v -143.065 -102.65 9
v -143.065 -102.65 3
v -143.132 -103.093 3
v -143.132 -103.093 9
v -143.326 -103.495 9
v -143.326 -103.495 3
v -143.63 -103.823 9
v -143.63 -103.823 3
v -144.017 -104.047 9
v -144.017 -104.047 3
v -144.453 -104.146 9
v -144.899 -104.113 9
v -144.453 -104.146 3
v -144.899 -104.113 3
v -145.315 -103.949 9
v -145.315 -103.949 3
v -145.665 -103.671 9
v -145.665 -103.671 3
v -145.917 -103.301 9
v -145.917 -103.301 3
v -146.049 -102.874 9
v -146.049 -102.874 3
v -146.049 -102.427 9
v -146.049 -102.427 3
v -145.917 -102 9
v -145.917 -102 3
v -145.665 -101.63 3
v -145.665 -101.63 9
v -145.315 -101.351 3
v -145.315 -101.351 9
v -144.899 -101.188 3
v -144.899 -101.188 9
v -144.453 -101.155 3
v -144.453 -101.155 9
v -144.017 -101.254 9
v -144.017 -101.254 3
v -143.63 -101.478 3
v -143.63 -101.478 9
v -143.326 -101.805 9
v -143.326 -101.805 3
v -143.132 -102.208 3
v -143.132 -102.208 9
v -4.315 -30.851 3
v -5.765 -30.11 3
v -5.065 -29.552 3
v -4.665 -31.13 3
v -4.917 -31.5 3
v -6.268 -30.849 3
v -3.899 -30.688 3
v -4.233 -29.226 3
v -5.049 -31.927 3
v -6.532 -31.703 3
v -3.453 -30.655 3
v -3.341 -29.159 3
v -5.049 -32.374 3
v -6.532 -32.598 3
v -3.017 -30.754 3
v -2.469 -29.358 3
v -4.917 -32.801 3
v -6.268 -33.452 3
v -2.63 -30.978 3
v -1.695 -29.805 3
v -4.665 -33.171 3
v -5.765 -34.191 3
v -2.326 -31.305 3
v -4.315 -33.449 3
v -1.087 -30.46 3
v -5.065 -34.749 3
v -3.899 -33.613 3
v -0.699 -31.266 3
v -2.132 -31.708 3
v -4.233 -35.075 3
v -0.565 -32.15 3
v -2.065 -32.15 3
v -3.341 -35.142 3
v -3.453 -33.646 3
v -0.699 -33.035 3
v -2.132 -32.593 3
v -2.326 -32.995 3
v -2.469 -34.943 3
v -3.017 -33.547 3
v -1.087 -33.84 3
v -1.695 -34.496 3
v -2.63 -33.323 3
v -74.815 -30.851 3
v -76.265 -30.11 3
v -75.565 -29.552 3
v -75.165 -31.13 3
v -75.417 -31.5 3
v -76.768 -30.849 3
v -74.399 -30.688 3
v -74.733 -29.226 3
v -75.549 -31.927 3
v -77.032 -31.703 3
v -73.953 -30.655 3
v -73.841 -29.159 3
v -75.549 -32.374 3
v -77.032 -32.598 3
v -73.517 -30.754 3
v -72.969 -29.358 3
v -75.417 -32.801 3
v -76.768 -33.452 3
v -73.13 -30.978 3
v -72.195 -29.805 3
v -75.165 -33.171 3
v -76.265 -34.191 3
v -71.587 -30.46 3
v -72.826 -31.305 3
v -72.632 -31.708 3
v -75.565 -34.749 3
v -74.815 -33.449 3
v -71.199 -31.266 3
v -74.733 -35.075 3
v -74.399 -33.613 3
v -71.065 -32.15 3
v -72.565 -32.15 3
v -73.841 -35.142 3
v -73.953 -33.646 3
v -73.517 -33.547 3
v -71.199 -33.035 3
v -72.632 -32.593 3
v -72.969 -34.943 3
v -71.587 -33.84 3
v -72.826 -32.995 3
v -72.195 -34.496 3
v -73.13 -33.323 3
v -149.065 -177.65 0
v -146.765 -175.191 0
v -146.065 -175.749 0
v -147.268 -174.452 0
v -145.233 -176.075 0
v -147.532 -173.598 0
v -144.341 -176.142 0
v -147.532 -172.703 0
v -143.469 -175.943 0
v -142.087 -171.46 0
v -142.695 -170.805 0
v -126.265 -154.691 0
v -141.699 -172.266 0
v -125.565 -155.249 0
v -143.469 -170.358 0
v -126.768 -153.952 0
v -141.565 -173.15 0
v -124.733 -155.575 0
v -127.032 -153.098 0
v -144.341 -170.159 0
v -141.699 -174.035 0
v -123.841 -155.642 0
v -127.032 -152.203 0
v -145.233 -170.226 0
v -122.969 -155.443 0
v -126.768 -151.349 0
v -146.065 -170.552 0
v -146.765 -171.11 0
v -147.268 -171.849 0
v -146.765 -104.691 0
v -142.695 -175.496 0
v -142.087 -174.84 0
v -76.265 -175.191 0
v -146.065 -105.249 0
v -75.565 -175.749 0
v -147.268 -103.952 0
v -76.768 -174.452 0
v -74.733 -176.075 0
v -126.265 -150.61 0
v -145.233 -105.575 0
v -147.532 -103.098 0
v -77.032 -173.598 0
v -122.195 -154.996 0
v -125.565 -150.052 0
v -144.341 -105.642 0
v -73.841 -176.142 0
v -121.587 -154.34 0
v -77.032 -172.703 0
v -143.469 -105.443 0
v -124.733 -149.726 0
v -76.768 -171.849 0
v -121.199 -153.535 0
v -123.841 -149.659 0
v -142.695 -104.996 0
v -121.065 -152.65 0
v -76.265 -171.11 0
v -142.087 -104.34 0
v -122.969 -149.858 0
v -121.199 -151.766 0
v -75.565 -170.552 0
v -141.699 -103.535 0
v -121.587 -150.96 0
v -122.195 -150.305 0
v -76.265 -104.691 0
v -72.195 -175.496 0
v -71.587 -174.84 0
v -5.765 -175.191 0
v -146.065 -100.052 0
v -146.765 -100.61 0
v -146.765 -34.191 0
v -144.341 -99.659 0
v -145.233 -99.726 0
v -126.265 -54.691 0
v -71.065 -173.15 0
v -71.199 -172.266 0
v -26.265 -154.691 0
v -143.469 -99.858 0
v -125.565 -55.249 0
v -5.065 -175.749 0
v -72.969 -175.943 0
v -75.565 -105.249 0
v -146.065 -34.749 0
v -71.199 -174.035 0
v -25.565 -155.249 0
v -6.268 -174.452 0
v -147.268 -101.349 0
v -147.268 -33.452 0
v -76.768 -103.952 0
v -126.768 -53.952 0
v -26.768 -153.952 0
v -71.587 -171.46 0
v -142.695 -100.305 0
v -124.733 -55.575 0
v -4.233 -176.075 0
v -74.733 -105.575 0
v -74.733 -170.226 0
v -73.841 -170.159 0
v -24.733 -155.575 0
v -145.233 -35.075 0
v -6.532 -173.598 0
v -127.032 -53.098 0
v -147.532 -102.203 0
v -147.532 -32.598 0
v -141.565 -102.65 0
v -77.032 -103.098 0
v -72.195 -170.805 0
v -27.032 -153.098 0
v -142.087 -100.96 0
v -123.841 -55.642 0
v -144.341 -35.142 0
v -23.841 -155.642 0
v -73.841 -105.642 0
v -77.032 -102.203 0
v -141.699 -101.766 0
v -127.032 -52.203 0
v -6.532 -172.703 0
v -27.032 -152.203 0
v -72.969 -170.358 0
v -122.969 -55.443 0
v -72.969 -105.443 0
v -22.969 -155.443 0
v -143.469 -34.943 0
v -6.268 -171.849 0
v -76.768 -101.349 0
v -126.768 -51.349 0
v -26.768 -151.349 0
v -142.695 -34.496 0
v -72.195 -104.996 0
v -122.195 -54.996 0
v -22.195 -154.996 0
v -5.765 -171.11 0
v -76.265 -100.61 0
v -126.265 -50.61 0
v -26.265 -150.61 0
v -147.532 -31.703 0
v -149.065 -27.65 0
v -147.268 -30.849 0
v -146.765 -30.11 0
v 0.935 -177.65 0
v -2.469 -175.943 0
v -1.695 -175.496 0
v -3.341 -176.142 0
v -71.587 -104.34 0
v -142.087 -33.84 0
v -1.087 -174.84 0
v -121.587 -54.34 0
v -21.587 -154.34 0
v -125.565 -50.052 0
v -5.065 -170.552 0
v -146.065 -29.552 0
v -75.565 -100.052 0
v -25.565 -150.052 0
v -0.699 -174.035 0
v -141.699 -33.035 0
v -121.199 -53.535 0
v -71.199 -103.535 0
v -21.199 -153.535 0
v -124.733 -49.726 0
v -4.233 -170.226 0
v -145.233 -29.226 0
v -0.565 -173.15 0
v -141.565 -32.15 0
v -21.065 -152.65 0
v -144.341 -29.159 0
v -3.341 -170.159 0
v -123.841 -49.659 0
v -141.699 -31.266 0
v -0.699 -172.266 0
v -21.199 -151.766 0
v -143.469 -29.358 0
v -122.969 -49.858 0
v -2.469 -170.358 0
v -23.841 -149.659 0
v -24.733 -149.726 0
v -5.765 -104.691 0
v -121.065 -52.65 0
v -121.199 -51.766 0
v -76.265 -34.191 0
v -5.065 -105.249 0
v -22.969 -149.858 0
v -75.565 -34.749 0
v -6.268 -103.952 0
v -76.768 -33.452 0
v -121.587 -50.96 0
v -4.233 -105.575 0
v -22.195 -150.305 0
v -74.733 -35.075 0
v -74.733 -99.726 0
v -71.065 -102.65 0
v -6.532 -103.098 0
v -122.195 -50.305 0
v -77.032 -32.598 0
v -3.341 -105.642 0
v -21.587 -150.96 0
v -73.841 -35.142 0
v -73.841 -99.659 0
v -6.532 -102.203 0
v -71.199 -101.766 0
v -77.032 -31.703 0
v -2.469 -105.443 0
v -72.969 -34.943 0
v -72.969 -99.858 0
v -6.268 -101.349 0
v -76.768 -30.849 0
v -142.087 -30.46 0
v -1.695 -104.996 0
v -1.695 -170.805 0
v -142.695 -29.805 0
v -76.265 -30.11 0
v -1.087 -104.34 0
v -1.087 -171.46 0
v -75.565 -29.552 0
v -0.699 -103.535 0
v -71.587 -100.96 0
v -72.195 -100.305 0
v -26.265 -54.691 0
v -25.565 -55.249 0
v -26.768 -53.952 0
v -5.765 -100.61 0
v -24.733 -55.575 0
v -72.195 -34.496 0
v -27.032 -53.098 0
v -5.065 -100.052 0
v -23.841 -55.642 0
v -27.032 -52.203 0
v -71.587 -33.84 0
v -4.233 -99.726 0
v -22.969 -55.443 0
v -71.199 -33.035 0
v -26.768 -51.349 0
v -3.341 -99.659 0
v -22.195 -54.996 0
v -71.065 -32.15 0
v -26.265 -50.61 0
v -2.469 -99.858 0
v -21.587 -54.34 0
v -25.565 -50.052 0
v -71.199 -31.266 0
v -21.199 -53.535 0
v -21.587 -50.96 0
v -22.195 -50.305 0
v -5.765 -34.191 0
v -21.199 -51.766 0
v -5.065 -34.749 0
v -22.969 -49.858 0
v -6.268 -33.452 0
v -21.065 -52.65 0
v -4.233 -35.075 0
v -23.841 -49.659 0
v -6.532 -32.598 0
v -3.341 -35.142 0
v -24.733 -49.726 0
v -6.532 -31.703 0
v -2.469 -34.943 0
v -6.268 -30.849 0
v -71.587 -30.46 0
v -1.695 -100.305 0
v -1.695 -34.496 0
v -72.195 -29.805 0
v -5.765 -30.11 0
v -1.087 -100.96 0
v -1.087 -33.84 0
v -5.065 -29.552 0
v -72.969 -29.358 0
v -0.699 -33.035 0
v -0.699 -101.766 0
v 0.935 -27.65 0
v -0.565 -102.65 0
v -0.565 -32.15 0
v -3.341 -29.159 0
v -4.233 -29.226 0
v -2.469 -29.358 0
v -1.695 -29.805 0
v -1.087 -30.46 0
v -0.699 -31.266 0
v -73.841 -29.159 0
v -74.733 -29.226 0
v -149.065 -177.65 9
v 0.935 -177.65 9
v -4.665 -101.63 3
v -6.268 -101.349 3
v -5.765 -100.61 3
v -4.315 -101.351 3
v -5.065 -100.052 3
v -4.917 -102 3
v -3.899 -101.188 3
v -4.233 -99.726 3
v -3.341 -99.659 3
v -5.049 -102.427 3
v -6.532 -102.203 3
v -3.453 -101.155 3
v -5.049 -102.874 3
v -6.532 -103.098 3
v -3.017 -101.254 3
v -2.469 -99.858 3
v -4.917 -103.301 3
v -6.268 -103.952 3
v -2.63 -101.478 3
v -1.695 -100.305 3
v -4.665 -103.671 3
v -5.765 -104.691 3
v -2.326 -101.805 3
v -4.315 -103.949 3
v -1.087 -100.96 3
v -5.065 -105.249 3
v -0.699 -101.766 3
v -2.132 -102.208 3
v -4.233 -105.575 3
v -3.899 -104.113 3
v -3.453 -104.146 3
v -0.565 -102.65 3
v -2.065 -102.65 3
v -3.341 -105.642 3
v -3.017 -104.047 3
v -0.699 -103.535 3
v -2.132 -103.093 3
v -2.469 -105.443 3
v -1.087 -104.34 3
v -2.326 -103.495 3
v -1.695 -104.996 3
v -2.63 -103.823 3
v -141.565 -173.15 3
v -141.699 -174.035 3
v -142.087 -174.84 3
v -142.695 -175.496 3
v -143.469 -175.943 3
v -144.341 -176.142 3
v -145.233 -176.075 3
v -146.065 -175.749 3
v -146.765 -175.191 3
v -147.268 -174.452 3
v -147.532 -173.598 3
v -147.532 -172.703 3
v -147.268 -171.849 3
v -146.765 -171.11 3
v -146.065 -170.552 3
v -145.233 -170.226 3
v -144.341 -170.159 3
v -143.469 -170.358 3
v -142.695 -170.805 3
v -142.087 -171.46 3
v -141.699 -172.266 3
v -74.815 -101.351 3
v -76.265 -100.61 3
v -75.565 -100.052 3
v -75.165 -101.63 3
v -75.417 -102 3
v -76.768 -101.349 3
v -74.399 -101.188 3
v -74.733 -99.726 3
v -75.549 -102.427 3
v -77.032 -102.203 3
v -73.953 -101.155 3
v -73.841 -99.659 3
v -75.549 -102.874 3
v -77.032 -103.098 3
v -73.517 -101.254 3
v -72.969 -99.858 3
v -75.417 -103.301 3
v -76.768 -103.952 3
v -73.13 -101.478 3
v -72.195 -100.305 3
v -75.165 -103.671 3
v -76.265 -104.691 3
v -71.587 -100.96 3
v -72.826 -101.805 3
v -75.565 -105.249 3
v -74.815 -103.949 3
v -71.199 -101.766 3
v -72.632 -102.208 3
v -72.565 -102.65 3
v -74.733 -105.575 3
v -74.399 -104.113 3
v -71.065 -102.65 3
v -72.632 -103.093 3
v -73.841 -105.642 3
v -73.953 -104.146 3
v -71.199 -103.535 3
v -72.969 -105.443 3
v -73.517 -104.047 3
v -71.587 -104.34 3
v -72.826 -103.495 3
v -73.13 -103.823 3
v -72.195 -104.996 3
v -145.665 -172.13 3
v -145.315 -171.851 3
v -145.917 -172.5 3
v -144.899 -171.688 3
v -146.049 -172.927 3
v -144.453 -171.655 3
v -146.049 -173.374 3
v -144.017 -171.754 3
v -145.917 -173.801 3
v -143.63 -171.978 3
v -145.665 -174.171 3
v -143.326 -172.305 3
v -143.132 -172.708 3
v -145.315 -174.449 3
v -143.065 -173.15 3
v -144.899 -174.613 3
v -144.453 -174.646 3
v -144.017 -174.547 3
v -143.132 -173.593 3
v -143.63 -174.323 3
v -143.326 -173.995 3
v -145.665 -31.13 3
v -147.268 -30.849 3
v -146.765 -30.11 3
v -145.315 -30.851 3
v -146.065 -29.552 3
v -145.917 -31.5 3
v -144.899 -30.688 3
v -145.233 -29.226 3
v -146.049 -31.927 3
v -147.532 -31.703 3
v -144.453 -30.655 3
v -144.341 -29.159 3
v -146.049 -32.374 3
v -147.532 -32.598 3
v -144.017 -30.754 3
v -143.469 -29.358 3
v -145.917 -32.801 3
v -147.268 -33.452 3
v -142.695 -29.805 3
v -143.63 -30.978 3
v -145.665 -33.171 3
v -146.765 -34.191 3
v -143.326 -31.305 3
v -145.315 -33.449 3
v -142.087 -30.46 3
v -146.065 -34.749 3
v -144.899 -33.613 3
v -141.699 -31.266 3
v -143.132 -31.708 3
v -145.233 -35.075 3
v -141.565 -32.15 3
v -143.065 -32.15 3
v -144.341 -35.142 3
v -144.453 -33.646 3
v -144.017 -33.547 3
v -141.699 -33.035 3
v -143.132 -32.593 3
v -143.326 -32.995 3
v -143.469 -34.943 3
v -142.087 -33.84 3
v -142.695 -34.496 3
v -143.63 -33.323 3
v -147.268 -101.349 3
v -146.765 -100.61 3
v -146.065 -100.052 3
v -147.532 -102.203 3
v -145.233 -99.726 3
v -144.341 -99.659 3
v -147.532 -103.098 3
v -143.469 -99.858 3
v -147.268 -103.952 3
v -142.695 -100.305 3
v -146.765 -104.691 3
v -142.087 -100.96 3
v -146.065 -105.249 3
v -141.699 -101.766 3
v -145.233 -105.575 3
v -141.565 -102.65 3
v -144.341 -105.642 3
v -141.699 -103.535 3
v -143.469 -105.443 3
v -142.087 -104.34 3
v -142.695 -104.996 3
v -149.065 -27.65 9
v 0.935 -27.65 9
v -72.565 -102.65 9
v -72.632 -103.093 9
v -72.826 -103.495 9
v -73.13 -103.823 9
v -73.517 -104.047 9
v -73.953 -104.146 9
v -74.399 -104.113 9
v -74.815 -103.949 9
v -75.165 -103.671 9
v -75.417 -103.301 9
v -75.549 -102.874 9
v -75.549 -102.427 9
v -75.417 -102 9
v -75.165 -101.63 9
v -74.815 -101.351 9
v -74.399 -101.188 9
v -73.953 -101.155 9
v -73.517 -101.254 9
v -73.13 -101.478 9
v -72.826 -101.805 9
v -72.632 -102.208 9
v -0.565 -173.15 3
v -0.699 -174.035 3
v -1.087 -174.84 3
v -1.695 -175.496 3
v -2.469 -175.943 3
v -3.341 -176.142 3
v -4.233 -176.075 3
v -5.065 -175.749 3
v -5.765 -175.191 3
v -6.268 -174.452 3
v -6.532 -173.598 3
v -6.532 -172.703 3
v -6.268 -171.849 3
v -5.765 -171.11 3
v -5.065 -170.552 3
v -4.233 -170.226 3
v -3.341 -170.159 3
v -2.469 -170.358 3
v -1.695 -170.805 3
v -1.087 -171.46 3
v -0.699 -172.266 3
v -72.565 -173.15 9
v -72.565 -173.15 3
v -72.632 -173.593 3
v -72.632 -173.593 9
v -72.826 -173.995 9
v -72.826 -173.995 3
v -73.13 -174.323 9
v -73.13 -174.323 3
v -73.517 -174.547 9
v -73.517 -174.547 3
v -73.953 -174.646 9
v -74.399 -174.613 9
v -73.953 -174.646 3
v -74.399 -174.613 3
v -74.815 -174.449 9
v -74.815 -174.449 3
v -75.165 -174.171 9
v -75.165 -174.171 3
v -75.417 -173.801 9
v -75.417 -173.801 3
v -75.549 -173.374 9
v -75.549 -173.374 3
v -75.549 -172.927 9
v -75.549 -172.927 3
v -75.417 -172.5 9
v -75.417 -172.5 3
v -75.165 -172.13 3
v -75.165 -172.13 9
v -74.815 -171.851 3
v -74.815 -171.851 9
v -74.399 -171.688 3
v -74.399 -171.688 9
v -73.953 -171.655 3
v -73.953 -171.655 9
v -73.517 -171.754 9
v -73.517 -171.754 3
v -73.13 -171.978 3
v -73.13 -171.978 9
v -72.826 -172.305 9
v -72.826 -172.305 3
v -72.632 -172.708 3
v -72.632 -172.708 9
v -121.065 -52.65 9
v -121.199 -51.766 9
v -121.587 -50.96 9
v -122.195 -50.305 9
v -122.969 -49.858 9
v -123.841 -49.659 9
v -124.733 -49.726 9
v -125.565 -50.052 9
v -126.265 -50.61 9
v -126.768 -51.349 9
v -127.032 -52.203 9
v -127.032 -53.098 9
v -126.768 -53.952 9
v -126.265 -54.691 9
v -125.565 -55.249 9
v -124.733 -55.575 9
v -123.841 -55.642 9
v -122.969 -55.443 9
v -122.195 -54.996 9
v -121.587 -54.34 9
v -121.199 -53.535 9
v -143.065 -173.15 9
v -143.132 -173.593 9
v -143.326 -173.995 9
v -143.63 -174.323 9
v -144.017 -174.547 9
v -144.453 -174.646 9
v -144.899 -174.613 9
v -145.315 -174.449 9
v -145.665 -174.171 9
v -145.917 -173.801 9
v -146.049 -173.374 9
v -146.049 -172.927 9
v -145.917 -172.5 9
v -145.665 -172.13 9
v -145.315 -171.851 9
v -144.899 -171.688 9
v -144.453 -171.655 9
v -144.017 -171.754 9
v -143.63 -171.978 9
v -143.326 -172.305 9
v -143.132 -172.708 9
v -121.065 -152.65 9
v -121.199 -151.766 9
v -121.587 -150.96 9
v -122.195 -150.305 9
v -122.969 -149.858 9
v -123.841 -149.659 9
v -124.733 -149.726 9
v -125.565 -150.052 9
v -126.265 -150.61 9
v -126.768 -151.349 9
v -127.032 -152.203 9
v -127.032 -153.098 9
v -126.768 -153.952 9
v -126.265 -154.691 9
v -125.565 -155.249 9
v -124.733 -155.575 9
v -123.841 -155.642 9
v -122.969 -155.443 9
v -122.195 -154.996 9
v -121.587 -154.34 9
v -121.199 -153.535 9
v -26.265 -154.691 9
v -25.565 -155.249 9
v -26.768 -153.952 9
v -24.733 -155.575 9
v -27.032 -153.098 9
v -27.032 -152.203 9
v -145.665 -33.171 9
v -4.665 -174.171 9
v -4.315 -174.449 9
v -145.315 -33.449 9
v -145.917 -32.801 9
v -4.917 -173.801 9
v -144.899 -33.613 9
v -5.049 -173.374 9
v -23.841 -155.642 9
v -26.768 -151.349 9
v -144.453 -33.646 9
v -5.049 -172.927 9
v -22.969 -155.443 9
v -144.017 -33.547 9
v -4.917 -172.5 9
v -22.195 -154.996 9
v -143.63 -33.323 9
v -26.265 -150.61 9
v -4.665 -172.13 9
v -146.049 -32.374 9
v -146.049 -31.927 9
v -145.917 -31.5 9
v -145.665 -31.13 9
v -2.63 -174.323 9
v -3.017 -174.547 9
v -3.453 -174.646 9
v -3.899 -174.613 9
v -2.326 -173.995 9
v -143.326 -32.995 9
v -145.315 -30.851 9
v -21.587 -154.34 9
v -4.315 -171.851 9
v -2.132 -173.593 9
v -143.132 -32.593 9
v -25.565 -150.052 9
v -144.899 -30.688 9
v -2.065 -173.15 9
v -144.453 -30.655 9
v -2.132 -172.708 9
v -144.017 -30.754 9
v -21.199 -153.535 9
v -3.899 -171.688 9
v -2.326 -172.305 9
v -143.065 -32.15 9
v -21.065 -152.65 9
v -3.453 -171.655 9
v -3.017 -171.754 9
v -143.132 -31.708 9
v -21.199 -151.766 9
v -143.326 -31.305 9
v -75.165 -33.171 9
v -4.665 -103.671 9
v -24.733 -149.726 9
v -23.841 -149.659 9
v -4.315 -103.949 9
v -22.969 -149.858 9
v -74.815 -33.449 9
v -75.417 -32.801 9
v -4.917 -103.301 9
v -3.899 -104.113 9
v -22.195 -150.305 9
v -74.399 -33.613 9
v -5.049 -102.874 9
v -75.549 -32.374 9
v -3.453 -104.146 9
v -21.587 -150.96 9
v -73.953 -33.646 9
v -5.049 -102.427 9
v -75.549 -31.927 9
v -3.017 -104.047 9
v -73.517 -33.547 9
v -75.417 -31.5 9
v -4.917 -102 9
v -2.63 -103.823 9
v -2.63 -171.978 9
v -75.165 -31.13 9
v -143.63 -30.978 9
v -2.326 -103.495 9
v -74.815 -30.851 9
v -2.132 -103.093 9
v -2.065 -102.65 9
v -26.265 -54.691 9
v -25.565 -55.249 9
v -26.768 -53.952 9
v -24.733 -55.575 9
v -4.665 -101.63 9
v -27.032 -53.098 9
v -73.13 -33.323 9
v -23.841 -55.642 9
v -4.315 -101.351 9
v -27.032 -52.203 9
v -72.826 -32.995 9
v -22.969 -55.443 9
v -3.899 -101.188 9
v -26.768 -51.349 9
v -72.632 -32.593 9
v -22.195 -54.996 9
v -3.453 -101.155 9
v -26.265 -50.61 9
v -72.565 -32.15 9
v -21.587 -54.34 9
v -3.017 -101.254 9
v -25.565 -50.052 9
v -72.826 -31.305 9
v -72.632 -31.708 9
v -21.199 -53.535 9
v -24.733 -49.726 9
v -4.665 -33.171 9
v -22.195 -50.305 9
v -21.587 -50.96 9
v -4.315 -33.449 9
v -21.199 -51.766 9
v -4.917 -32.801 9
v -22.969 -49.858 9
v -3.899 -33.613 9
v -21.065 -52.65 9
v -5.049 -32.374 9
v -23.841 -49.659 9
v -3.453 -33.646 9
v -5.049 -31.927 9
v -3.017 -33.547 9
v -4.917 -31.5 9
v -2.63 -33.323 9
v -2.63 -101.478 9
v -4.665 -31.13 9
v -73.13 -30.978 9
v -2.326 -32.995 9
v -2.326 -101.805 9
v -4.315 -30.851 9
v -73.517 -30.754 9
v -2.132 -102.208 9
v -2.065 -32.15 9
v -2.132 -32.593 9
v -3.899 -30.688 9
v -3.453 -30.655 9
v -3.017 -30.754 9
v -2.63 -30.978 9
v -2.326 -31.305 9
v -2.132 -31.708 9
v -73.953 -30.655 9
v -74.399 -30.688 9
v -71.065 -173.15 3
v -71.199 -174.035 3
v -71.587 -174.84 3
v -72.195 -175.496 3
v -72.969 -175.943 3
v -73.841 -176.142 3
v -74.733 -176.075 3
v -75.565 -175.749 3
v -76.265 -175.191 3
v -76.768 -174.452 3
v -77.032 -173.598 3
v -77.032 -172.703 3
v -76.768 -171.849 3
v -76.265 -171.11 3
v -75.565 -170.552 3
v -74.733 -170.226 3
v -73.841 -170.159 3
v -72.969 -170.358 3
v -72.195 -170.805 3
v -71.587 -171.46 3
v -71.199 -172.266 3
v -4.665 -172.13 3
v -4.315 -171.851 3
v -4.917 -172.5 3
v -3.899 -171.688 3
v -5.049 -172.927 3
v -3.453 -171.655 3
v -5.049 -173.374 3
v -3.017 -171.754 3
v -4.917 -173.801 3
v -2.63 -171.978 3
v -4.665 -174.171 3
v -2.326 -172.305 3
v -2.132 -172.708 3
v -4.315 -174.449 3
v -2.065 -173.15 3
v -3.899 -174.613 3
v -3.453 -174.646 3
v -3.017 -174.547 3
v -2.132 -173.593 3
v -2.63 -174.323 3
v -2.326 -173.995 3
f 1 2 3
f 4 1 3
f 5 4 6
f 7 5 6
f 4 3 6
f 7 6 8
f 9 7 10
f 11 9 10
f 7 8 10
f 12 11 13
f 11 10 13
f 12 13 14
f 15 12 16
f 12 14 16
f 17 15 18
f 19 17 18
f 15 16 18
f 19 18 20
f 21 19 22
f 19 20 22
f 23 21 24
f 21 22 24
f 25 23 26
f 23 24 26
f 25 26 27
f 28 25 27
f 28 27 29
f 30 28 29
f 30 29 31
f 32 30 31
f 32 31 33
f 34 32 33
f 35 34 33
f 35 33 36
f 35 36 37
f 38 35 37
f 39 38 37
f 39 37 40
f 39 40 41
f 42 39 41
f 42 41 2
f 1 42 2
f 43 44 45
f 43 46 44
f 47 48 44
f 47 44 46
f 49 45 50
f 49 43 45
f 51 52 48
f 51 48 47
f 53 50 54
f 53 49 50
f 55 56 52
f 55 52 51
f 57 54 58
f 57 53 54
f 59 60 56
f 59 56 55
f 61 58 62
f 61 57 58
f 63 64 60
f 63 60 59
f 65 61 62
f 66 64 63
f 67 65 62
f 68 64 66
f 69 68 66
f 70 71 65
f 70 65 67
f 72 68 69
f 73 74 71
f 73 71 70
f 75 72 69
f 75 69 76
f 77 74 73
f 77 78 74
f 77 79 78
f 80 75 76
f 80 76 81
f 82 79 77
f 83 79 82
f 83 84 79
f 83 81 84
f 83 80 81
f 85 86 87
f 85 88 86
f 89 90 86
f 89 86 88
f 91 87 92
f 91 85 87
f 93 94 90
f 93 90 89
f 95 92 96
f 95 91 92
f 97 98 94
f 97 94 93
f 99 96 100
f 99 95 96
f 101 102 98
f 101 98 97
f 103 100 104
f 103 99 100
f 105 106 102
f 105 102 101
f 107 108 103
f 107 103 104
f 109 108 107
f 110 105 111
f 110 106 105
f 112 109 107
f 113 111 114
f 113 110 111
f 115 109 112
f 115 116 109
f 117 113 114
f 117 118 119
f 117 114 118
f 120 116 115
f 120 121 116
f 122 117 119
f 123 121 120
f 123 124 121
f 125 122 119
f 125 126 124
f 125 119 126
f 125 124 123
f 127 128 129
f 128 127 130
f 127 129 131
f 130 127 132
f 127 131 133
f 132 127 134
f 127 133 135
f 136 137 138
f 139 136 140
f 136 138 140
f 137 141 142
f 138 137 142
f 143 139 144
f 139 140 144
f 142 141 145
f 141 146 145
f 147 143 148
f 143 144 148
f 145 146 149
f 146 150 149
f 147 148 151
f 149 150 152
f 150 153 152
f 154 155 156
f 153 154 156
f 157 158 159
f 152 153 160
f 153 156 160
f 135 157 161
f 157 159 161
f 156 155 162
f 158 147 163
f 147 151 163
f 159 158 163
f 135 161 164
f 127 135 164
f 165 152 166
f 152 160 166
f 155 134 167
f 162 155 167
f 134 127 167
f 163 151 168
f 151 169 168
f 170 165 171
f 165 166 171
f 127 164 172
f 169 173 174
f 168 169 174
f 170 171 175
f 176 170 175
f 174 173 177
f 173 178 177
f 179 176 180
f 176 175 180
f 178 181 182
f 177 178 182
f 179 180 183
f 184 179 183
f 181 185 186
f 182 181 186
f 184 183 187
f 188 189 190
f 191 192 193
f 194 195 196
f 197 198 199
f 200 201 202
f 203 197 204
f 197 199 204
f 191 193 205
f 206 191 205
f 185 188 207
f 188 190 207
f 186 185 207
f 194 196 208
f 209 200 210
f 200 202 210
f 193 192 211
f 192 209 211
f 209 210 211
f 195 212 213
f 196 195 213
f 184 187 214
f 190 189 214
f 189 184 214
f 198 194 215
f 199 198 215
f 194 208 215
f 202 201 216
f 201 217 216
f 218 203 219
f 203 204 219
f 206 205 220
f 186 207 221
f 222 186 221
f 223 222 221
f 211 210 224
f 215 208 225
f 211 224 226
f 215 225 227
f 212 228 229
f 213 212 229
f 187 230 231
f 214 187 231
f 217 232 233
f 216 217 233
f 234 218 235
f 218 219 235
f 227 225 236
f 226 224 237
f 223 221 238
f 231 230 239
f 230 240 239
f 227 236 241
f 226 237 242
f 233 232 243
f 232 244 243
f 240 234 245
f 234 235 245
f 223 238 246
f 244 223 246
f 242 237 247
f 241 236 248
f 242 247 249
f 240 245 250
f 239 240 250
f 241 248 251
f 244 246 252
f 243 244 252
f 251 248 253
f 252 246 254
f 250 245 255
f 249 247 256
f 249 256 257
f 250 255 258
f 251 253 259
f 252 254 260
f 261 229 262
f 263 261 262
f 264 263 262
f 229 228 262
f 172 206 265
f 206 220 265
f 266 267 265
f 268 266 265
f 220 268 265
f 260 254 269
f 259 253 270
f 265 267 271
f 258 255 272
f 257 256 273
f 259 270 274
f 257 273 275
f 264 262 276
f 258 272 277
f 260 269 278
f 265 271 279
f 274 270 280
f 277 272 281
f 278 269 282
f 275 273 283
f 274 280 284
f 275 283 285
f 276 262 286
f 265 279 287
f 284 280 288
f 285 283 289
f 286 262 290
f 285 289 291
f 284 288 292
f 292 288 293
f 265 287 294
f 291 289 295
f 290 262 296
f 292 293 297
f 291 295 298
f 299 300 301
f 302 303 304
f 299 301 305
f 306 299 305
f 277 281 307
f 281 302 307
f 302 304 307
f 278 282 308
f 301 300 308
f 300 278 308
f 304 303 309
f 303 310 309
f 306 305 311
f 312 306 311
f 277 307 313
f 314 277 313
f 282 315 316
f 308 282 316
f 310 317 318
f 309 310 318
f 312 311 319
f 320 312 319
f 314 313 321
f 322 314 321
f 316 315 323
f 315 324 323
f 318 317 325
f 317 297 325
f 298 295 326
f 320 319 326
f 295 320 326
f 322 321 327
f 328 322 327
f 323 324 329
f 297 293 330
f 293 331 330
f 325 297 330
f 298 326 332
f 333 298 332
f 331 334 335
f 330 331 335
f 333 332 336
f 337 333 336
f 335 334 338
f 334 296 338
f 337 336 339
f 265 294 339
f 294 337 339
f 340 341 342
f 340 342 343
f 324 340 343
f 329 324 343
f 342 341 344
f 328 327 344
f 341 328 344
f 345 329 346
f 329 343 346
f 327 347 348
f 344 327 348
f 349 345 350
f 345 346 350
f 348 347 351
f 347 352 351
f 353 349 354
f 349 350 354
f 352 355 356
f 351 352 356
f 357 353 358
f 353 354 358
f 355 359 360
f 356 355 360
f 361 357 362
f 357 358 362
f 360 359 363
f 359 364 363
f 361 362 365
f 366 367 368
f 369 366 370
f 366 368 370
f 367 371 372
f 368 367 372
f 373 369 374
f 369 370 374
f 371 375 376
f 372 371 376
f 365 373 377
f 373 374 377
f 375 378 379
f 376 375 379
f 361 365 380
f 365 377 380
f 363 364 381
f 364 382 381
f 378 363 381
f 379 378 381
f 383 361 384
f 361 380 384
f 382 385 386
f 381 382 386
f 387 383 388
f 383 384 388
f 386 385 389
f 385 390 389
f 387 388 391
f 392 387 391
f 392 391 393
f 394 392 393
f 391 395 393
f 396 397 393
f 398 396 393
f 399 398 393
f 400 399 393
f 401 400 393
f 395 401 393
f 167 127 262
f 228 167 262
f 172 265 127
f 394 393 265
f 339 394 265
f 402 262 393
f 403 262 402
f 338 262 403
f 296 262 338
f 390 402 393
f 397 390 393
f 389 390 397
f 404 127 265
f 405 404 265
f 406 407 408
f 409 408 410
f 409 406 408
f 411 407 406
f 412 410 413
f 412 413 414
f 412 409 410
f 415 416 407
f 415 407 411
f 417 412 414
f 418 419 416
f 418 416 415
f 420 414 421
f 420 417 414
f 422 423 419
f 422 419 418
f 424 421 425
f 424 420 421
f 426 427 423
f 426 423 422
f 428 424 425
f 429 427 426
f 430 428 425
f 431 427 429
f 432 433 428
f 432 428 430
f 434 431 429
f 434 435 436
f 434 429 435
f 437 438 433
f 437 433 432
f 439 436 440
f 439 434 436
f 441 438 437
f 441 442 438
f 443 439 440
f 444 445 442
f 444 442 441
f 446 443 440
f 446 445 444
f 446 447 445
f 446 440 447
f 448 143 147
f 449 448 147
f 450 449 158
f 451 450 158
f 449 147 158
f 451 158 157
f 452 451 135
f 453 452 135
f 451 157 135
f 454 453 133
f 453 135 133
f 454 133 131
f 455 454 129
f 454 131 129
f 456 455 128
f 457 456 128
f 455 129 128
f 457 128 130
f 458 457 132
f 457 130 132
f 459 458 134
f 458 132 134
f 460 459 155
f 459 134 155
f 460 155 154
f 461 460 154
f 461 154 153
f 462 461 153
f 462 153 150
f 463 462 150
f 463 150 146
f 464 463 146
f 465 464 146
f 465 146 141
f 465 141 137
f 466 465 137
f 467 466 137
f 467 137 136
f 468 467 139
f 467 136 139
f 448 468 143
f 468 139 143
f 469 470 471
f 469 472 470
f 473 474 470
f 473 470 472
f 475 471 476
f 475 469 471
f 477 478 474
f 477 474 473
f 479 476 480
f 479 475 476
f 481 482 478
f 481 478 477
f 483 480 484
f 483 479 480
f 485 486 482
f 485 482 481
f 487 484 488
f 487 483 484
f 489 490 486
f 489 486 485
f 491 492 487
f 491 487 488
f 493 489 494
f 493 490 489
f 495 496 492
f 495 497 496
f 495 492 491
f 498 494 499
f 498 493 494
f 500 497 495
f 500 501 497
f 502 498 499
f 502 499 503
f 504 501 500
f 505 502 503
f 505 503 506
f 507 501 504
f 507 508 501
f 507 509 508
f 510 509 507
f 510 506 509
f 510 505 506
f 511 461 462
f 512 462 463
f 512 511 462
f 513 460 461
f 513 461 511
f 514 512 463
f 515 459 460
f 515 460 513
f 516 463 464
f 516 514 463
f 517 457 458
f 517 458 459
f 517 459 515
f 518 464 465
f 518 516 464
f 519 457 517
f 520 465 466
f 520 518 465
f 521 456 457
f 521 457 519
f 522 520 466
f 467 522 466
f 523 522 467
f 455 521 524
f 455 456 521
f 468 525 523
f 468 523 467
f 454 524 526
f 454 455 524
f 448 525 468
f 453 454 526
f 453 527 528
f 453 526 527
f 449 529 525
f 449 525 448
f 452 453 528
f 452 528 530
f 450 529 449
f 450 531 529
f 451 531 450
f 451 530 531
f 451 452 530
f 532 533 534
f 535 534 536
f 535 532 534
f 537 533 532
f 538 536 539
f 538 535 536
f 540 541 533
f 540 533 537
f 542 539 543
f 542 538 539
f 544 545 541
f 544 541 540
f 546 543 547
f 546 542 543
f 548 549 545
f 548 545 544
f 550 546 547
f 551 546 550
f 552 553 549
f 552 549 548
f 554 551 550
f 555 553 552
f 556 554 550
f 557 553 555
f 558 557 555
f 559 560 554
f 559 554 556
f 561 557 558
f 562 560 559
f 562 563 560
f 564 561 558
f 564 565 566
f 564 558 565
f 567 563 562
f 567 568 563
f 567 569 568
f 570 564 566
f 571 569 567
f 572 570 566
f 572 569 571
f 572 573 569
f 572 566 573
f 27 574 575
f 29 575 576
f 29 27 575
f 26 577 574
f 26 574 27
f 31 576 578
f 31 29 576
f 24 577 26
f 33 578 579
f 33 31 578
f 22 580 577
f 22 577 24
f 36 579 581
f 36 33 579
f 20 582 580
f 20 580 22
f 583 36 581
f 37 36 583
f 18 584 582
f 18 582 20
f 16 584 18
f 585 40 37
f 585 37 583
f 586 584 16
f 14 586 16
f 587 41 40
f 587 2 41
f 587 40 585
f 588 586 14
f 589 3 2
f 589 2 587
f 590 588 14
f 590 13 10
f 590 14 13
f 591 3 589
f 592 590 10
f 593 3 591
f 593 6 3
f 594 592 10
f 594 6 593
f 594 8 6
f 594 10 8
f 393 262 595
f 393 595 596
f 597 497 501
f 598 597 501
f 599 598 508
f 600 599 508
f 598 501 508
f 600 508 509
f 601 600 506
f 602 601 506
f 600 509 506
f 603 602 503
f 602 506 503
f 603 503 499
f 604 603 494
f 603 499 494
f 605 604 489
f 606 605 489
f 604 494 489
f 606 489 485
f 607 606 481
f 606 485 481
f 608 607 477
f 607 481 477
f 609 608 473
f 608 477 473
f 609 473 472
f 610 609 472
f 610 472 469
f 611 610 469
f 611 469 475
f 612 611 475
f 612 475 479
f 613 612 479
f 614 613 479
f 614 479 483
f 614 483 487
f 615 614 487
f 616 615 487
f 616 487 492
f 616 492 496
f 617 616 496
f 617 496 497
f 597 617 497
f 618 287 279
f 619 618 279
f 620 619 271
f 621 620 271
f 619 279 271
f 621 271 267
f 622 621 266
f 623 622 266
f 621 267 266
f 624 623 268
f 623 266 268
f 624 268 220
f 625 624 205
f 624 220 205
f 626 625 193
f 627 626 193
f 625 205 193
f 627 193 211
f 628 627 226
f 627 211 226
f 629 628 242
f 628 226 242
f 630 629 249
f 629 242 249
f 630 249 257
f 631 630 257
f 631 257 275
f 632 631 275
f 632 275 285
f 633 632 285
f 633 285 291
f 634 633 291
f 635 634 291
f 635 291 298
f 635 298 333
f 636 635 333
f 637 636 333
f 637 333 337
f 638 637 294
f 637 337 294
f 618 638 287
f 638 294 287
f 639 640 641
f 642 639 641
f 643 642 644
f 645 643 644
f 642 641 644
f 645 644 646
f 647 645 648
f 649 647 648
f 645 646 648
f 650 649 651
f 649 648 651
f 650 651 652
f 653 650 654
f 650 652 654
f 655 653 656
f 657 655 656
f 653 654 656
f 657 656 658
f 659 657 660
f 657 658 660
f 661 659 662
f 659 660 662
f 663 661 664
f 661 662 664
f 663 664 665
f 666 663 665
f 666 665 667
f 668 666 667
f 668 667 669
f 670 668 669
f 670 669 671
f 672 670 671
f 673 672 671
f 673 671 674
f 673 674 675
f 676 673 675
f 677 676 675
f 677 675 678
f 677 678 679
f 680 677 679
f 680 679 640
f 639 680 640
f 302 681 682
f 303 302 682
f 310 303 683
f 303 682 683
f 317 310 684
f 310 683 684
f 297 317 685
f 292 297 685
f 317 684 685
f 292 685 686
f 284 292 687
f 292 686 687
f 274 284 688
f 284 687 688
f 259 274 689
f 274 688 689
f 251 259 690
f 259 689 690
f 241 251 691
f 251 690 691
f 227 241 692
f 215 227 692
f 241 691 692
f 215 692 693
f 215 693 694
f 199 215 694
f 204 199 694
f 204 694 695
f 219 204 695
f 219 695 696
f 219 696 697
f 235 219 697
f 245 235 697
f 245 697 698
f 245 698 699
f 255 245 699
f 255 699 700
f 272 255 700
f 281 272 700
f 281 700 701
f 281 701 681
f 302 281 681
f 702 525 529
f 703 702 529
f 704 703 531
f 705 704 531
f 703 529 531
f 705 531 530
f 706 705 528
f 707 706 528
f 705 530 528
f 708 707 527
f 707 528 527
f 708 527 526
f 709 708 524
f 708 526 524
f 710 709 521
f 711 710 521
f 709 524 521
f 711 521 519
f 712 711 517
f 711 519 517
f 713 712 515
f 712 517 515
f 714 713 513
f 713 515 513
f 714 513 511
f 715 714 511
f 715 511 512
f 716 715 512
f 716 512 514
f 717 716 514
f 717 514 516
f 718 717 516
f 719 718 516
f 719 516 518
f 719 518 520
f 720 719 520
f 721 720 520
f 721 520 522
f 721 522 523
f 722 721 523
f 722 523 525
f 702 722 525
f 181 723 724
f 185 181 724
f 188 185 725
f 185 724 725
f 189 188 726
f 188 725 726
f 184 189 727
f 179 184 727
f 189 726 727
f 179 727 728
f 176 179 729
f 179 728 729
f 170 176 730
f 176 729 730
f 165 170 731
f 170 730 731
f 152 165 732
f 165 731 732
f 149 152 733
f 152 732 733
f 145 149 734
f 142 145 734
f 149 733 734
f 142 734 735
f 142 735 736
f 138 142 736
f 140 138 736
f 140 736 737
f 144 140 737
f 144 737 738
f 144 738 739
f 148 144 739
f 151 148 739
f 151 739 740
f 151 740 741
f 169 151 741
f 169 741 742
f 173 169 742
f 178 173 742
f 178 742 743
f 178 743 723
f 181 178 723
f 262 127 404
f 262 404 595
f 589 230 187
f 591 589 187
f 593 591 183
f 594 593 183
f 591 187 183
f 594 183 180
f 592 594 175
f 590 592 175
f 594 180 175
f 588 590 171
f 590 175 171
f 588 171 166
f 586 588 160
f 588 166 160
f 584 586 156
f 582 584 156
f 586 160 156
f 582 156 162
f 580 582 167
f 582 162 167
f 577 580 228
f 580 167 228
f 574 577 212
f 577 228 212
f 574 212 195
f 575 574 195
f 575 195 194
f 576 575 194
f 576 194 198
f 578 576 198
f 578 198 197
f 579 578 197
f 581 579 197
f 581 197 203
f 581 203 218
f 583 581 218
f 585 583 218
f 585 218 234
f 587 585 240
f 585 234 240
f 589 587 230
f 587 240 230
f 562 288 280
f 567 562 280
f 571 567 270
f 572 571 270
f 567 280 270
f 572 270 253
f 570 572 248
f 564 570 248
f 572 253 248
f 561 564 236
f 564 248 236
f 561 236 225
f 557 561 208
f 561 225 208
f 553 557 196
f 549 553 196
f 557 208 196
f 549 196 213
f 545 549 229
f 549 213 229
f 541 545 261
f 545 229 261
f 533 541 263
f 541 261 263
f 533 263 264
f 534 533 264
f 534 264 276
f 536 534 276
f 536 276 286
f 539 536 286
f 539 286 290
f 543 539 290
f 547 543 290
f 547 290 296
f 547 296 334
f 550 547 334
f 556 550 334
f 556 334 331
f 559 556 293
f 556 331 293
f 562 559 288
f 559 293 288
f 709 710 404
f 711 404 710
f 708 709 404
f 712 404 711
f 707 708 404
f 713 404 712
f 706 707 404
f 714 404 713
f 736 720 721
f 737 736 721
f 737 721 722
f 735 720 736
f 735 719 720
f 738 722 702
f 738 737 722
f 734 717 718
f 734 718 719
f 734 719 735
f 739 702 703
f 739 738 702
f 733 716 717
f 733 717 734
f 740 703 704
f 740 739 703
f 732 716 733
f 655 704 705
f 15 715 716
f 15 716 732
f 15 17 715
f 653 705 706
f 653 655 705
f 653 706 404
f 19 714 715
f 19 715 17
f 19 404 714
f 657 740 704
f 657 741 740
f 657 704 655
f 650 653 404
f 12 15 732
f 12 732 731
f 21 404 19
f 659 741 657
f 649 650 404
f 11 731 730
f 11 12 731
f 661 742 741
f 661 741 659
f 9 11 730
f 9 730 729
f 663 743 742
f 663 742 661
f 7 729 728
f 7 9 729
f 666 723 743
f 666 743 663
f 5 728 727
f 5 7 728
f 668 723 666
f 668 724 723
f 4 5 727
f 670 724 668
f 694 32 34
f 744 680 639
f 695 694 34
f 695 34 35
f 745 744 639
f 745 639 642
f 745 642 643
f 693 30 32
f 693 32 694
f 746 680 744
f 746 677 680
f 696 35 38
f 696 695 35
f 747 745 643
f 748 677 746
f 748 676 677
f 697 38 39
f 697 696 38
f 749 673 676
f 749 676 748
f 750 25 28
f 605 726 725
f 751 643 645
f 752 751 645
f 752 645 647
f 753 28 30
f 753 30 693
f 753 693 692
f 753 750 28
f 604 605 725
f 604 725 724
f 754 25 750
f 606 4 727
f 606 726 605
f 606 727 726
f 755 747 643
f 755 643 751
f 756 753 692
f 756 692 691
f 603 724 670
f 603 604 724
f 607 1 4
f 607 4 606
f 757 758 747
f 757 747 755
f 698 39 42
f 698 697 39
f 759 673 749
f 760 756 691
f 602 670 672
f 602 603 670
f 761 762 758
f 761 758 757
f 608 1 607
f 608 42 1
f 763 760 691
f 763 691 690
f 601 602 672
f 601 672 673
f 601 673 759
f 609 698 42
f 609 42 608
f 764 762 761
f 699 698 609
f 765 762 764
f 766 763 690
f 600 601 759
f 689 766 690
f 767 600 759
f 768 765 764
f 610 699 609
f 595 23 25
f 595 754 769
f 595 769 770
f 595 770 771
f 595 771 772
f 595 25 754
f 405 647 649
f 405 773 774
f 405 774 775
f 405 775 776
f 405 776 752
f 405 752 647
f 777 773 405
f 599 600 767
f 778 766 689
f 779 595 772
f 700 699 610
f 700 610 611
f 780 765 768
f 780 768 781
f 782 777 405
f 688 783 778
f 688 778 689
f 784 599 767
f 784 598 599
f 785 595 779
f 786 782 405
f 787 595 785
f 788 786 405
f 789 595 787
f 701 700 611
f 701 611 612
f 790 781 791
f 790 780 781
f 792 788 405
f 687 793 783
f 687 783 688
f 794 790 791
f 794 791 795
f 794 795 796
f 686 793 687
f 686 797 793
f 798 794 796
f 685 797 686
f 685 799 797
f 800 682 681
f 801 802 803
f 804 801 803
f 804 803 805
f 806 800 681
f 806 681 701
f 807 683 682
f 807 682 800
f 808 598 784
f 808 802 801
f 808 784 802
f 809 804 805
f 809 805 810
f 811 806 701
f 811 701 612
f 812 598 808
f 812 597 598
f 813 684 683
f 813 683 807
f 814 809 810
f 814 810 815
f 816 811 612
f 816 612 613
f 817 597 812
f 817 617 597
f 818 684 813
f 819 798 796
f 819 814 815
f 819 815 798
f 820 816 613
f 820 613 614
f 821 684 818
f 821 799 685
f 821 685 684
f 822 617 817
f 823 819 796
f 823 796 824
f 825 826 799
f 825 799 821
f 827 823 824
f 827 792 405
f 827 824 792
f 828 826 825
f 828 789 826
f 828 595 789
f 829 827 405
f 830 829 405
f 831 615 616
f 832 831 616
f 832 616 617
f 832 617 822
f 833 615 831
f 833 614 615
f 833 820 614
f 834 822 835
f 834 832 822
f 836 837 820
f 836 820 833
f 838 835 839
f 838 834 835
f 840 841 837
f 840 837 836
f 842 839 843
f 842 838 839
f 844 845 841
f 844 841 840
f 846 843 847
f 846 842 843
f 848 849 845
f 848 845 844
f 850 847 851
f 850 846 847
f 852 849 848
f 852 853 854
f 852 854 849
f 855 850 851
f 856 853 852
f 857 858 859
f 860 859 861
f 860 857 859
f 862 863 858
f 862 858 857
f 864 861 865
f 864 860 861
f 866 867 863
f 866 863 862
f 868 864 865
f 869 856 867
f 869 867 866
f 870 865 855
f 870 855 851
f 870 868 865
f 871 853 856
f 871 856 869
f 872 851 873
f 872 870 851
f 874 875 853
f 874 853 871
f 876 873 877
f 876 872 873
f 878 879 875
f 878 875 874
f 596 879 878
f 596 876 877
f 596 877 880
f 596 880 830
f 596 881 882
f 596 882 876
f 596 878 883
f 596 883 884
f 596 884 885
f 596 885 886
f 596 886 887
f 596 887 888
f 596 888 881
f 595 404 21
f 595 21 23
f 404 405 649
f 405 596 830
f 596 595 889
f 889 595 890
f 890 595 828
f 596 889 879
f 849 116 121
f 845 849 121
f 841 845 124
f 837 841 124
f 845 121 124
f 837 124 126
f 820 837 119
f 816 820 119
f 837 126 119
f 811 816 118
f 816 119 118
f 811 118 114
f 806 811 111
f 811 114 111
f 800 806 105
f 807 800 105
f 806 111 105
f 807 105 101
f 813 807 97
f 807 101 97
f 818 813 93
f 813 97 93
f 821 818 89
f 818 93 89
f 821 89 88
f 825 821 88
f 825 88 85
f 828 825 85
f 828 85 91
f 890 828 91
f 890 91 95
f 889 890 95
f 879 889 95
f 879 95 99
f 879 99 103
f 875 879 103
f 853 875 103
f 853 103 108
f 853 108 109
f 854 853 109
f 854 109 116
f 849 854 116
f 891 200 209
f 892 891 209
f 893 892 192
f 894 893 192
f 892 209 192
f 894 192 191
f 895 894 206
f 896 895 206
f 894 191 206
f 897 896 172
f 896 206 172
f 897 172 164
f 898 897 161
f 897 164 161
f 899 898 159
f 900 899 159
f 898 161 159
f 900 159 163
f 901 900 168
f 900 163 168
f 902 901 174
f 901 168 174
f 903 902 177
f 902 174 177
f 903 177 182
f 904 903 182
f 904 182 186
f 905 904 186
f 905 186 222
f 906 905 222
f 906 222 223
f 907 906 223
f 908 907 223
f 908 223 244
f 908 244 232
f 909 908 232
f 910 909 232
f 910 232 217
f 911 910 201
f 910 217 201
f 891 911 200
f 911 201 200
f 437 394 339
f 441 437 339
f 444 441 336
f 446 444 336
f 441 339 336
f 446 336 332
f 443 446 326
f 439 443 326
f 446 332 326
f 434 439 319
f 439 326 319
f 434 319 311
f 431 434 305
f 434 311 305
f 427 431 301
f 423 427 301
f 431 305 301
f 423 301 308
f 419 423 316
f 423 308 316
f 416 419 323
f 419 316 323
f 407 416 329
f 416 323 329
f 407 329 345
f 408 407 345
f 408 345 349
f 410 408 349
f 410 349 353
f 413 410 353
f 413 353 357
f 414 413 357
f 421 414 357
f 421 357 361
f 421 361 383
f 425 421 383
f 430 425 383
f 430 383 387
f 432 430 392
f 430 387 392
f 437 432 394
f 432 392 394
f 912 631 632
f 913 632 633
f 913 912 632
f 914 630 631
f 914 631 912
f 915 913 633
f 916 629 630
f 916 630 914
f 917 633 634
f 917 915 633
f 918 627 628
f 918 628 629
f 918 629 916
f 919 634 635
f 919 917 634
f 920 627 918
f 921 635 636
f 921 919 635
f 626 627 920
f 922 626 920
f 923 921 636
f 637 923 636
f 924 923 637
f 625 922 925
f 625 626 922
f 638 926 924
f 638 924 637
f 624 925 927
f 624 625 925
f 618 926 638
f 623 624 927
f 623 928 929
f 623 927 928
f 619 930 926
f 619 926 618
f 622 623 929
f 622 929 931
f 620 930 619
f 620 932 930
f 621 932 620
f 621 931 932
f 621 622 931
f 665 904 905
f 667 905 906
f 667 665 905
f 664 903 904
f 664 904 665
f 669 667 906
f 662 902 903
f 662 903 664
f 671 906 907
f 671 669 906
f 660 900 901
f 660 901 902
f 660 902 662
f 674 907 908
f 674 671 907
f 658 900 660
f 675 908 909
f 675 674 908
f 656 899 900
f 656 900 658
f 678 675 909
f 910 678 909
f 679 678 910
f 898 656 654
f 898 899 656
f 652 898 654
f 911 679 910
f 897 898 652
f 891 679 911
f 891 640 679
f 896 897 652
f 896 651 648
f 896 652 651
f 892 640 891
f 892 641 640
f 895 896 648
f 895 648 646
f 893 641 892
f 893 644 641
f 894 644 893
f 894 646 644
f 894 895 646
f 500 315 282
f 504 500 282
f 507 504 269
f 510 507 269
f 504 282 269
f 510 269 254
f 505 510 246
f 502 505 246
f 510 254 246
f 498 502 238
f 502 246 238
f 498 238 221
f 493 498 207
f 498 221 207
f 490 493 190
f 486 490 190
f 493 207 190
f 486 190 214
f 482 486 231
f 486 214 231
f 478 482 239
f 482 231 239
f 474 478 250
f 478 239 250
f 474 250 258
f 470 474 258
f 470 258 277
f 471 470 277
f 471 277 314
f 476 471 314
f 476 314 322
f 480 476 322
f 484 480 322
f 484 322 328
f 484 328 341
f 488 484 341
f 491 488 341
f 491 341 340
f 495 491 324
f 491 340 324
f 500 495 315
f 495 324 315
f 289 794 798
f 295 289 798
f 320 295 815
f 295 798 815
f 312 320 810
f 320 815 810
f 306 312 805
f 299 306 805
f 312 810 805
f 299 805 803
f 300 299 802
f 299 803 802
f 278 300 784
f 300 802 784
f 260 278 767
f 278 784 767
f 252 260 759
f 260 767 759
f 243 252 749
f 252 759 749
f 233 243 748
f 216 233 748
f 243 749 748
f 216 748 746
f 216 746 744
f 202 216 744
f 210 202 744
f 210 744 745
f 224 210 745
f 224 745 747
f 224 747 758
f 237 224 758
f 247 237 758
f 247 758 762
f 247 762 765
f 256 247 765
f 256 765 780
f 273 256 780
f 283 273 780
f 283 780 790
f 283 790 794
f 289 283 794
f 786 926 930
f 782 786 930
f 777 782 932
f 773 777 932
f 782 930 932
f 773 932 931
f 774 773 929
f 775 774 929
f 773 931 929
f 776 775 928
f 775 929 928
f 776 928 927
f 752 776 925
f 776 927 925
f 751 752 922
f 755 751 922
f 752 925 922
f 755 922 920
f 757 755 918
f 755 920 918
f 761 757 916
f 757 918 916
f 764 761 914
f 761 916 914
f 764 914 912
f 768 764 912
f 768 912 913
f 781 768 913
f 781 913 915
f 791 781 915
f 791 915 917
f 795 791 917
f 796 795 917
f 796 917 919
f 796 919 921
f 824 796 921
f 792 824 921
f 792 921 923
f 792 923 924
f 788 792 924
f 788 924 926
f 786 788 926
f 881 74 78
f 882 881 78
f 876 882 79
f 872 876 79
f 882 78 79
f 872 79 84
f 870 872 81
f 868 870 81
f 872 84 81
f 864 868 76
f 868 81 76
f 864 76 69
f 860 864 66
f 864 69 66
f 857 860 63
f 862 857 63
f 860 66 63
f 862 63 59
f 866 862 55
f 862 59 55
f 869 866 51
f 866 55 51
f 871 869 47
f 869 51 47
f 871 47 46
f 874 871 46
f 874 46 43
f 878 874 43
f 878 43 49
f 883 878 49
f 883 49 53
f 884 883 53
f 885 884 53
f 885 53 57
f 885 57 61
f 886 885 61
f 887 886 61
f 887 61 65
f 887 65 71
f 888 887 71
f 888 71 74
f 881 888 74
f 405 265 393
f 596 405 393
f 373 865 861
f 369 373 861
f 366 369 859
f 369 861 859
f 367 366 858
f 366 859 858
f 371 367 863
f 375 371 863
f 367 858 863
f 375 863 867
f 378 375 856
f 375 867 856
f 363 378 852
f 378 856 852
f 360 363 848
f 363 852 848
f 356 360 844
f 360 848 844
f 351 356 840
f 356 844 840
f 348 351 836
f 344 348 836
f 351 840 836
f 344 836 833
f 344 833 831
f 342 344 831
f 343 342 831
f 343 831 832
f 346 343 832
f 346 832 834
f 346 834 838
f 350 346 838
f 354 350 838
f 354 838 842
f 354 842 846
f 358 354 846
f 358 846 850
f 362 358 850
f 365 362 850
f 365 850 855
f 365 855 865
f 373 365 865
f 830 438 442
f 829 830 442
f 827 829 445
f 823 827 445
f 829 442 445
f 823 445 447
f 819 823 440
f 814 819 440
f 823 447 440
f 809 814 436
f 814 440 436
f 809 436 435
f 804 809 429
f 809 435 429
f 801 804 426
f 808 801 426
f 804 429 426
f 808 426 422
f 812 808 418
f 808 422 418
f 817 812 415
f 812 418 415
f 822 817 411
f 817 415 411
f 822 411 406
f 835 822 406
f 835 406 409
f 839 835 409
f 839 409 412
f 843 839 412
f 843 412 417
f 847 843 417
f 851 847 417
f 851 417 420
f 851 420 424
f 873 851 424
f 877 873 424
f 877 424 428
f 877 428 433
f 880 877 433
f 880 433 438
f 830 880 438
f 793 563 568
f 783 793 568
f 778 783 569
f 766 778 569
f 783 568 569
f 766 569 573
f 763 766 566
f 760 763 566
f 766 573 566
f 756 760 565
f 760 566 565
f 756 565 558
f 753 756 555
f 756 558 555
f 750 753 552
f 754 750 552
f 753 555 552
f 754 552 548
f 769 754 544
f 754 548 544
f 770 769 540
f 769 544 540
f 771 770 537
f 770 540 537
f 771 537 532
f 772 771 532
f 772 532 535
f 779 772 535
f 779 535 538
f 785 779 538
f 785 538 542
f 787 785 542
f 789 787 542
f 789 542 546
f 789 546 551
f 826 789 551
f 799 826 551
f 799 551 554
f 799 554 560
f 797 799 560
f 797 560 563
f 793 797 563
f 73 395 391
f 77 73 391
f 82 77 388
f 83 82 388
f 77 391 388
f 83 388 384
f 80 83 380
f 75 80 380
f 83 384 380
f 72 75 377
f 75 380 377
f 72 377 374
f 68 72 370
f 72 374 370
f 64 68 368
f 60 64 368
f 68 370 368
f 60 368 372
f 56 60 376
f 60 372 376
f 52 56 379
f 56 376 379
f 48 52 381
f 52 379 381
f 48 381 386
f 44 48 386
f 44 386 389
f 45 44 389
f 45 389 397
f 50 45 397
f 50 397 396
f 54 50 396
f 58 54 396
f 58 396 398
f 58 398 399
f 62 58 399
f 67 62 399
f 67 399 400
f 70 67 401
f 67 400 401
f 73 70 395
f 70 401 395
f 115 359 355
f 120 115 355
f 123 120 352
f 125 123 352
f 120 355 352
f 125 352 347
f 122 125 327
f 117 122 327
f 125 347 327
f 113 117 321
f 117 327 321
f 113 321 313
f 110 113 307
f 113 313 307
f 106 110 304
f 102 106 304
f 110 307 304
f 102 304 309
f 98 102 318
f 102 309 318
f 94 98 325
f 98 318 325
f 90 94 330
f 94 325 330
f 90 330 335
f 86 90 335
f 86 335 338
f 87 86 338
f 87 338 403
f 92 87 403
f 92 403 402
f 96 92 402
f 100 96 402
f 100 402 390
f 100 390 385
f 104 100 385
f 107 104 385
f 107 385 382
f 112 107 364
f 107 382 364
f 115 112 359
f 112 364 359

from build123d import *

# Parameters (mm, degrees)
F0_W     = 150
F0_H     = 150
F1_DEPTH = 9
F2_R     = 3
F3_DEPTH = 9.001
F4_R     = 1.5
F5_DEPTH = 9.001
F6_R     = 3
F7_DEPTH = 3


with BuildPart() as f1:
    # F0 (on Top) → F1 (new body)
    with BuildSketch(Plane.XY):
        with Locations((-74.065436, -102.650428)):
            Rectangle(F0_W, F0_H)
    extrude(amount=F1_DEPTH)

    # F2 (on face) → F3 (cut, through all)
    with BuildSketch(Plane.XY.offset(9)):
        with Locations((-124.065436, -52.650428)):
            Circle(F2_R)
        with Locations((-124.065436, -152.650428)):
            Circle(F2_R)
        with Locations((-24.065436, -152.650428)):
            Circle(F2_R)
        with Locations((-24.065436, -52.650428)):
            Circle(F2_R)
    extrude(amount=-F3_DEPTH, mode=Mode.SUBTRACT)

    # F4 (on face) → F5 (cut, through all)
    with BuildSketch(Plane(origin=(0, 0, 0), x_dir=(1, 0, 0), z_dir=(0, 0, -1))):
        with Locations((-144.565436, 173.150428)):
            Circle(F4_R)
        with Locations((-74.065436, 173.150428)):
            Circle(F4_R)
        with Locations((-3.565436, 173.150428)):
            Circle(F4_R)
        with Locations((-3.565436, 102.650428)):
            Circle(F4_R)
        with Locations((-3.565436, 32.150428)):
            Circle(F4_R)
        with Locations((-74.065436, 32.150428)):
            Circle(F4_R)
        with Locations((-144.565436, 32.150428)):
            Circle(F4_R)
        with Locations((-144.565436, 102.650428)):
            Circle(F4_R)
        with Locations((-74.065436, 102.650428)):
            Circle(F4_R)
    extrude(amount=-F5_DEPTH, mode=Mode.SUBTRACT)

    # F6 (on face) → F7 (cut)
    with BuildSketch(Plane(origin=(0, 0, 0), x_dir=(1, 0, 0), z_dir=(0, 0, -1))):
        with Locations((-144.565436, 173.150428)):
            Circle(F6_R)
        with Locations((-74.065436, 173.150428)):
            Circle(F6_R)
        with Locations((-3.565436, 173.150428)):
            Circle(F6_R)
        with Locations((-3.565436, 102.650428)):
            Circle(F6_R)
        with Locations((-74.065436, 102.650428)):
            Circle(F6_R)
        with Locations((-144.565436, 102.650428)):
            Circle(F6_R)
        with Locations((-144.565436, 32.150428)):
            Circle(F6_R)
        with Locations((-74.065436, 32.150428)):
            Circle(F6_R)
        with Locations((-3.565436, 32.150428)):
            Circle(F6_R)
    extrude(amount=-F7_DEPTH, mode=Mode.SUBTRACT)


solid = f1.part
